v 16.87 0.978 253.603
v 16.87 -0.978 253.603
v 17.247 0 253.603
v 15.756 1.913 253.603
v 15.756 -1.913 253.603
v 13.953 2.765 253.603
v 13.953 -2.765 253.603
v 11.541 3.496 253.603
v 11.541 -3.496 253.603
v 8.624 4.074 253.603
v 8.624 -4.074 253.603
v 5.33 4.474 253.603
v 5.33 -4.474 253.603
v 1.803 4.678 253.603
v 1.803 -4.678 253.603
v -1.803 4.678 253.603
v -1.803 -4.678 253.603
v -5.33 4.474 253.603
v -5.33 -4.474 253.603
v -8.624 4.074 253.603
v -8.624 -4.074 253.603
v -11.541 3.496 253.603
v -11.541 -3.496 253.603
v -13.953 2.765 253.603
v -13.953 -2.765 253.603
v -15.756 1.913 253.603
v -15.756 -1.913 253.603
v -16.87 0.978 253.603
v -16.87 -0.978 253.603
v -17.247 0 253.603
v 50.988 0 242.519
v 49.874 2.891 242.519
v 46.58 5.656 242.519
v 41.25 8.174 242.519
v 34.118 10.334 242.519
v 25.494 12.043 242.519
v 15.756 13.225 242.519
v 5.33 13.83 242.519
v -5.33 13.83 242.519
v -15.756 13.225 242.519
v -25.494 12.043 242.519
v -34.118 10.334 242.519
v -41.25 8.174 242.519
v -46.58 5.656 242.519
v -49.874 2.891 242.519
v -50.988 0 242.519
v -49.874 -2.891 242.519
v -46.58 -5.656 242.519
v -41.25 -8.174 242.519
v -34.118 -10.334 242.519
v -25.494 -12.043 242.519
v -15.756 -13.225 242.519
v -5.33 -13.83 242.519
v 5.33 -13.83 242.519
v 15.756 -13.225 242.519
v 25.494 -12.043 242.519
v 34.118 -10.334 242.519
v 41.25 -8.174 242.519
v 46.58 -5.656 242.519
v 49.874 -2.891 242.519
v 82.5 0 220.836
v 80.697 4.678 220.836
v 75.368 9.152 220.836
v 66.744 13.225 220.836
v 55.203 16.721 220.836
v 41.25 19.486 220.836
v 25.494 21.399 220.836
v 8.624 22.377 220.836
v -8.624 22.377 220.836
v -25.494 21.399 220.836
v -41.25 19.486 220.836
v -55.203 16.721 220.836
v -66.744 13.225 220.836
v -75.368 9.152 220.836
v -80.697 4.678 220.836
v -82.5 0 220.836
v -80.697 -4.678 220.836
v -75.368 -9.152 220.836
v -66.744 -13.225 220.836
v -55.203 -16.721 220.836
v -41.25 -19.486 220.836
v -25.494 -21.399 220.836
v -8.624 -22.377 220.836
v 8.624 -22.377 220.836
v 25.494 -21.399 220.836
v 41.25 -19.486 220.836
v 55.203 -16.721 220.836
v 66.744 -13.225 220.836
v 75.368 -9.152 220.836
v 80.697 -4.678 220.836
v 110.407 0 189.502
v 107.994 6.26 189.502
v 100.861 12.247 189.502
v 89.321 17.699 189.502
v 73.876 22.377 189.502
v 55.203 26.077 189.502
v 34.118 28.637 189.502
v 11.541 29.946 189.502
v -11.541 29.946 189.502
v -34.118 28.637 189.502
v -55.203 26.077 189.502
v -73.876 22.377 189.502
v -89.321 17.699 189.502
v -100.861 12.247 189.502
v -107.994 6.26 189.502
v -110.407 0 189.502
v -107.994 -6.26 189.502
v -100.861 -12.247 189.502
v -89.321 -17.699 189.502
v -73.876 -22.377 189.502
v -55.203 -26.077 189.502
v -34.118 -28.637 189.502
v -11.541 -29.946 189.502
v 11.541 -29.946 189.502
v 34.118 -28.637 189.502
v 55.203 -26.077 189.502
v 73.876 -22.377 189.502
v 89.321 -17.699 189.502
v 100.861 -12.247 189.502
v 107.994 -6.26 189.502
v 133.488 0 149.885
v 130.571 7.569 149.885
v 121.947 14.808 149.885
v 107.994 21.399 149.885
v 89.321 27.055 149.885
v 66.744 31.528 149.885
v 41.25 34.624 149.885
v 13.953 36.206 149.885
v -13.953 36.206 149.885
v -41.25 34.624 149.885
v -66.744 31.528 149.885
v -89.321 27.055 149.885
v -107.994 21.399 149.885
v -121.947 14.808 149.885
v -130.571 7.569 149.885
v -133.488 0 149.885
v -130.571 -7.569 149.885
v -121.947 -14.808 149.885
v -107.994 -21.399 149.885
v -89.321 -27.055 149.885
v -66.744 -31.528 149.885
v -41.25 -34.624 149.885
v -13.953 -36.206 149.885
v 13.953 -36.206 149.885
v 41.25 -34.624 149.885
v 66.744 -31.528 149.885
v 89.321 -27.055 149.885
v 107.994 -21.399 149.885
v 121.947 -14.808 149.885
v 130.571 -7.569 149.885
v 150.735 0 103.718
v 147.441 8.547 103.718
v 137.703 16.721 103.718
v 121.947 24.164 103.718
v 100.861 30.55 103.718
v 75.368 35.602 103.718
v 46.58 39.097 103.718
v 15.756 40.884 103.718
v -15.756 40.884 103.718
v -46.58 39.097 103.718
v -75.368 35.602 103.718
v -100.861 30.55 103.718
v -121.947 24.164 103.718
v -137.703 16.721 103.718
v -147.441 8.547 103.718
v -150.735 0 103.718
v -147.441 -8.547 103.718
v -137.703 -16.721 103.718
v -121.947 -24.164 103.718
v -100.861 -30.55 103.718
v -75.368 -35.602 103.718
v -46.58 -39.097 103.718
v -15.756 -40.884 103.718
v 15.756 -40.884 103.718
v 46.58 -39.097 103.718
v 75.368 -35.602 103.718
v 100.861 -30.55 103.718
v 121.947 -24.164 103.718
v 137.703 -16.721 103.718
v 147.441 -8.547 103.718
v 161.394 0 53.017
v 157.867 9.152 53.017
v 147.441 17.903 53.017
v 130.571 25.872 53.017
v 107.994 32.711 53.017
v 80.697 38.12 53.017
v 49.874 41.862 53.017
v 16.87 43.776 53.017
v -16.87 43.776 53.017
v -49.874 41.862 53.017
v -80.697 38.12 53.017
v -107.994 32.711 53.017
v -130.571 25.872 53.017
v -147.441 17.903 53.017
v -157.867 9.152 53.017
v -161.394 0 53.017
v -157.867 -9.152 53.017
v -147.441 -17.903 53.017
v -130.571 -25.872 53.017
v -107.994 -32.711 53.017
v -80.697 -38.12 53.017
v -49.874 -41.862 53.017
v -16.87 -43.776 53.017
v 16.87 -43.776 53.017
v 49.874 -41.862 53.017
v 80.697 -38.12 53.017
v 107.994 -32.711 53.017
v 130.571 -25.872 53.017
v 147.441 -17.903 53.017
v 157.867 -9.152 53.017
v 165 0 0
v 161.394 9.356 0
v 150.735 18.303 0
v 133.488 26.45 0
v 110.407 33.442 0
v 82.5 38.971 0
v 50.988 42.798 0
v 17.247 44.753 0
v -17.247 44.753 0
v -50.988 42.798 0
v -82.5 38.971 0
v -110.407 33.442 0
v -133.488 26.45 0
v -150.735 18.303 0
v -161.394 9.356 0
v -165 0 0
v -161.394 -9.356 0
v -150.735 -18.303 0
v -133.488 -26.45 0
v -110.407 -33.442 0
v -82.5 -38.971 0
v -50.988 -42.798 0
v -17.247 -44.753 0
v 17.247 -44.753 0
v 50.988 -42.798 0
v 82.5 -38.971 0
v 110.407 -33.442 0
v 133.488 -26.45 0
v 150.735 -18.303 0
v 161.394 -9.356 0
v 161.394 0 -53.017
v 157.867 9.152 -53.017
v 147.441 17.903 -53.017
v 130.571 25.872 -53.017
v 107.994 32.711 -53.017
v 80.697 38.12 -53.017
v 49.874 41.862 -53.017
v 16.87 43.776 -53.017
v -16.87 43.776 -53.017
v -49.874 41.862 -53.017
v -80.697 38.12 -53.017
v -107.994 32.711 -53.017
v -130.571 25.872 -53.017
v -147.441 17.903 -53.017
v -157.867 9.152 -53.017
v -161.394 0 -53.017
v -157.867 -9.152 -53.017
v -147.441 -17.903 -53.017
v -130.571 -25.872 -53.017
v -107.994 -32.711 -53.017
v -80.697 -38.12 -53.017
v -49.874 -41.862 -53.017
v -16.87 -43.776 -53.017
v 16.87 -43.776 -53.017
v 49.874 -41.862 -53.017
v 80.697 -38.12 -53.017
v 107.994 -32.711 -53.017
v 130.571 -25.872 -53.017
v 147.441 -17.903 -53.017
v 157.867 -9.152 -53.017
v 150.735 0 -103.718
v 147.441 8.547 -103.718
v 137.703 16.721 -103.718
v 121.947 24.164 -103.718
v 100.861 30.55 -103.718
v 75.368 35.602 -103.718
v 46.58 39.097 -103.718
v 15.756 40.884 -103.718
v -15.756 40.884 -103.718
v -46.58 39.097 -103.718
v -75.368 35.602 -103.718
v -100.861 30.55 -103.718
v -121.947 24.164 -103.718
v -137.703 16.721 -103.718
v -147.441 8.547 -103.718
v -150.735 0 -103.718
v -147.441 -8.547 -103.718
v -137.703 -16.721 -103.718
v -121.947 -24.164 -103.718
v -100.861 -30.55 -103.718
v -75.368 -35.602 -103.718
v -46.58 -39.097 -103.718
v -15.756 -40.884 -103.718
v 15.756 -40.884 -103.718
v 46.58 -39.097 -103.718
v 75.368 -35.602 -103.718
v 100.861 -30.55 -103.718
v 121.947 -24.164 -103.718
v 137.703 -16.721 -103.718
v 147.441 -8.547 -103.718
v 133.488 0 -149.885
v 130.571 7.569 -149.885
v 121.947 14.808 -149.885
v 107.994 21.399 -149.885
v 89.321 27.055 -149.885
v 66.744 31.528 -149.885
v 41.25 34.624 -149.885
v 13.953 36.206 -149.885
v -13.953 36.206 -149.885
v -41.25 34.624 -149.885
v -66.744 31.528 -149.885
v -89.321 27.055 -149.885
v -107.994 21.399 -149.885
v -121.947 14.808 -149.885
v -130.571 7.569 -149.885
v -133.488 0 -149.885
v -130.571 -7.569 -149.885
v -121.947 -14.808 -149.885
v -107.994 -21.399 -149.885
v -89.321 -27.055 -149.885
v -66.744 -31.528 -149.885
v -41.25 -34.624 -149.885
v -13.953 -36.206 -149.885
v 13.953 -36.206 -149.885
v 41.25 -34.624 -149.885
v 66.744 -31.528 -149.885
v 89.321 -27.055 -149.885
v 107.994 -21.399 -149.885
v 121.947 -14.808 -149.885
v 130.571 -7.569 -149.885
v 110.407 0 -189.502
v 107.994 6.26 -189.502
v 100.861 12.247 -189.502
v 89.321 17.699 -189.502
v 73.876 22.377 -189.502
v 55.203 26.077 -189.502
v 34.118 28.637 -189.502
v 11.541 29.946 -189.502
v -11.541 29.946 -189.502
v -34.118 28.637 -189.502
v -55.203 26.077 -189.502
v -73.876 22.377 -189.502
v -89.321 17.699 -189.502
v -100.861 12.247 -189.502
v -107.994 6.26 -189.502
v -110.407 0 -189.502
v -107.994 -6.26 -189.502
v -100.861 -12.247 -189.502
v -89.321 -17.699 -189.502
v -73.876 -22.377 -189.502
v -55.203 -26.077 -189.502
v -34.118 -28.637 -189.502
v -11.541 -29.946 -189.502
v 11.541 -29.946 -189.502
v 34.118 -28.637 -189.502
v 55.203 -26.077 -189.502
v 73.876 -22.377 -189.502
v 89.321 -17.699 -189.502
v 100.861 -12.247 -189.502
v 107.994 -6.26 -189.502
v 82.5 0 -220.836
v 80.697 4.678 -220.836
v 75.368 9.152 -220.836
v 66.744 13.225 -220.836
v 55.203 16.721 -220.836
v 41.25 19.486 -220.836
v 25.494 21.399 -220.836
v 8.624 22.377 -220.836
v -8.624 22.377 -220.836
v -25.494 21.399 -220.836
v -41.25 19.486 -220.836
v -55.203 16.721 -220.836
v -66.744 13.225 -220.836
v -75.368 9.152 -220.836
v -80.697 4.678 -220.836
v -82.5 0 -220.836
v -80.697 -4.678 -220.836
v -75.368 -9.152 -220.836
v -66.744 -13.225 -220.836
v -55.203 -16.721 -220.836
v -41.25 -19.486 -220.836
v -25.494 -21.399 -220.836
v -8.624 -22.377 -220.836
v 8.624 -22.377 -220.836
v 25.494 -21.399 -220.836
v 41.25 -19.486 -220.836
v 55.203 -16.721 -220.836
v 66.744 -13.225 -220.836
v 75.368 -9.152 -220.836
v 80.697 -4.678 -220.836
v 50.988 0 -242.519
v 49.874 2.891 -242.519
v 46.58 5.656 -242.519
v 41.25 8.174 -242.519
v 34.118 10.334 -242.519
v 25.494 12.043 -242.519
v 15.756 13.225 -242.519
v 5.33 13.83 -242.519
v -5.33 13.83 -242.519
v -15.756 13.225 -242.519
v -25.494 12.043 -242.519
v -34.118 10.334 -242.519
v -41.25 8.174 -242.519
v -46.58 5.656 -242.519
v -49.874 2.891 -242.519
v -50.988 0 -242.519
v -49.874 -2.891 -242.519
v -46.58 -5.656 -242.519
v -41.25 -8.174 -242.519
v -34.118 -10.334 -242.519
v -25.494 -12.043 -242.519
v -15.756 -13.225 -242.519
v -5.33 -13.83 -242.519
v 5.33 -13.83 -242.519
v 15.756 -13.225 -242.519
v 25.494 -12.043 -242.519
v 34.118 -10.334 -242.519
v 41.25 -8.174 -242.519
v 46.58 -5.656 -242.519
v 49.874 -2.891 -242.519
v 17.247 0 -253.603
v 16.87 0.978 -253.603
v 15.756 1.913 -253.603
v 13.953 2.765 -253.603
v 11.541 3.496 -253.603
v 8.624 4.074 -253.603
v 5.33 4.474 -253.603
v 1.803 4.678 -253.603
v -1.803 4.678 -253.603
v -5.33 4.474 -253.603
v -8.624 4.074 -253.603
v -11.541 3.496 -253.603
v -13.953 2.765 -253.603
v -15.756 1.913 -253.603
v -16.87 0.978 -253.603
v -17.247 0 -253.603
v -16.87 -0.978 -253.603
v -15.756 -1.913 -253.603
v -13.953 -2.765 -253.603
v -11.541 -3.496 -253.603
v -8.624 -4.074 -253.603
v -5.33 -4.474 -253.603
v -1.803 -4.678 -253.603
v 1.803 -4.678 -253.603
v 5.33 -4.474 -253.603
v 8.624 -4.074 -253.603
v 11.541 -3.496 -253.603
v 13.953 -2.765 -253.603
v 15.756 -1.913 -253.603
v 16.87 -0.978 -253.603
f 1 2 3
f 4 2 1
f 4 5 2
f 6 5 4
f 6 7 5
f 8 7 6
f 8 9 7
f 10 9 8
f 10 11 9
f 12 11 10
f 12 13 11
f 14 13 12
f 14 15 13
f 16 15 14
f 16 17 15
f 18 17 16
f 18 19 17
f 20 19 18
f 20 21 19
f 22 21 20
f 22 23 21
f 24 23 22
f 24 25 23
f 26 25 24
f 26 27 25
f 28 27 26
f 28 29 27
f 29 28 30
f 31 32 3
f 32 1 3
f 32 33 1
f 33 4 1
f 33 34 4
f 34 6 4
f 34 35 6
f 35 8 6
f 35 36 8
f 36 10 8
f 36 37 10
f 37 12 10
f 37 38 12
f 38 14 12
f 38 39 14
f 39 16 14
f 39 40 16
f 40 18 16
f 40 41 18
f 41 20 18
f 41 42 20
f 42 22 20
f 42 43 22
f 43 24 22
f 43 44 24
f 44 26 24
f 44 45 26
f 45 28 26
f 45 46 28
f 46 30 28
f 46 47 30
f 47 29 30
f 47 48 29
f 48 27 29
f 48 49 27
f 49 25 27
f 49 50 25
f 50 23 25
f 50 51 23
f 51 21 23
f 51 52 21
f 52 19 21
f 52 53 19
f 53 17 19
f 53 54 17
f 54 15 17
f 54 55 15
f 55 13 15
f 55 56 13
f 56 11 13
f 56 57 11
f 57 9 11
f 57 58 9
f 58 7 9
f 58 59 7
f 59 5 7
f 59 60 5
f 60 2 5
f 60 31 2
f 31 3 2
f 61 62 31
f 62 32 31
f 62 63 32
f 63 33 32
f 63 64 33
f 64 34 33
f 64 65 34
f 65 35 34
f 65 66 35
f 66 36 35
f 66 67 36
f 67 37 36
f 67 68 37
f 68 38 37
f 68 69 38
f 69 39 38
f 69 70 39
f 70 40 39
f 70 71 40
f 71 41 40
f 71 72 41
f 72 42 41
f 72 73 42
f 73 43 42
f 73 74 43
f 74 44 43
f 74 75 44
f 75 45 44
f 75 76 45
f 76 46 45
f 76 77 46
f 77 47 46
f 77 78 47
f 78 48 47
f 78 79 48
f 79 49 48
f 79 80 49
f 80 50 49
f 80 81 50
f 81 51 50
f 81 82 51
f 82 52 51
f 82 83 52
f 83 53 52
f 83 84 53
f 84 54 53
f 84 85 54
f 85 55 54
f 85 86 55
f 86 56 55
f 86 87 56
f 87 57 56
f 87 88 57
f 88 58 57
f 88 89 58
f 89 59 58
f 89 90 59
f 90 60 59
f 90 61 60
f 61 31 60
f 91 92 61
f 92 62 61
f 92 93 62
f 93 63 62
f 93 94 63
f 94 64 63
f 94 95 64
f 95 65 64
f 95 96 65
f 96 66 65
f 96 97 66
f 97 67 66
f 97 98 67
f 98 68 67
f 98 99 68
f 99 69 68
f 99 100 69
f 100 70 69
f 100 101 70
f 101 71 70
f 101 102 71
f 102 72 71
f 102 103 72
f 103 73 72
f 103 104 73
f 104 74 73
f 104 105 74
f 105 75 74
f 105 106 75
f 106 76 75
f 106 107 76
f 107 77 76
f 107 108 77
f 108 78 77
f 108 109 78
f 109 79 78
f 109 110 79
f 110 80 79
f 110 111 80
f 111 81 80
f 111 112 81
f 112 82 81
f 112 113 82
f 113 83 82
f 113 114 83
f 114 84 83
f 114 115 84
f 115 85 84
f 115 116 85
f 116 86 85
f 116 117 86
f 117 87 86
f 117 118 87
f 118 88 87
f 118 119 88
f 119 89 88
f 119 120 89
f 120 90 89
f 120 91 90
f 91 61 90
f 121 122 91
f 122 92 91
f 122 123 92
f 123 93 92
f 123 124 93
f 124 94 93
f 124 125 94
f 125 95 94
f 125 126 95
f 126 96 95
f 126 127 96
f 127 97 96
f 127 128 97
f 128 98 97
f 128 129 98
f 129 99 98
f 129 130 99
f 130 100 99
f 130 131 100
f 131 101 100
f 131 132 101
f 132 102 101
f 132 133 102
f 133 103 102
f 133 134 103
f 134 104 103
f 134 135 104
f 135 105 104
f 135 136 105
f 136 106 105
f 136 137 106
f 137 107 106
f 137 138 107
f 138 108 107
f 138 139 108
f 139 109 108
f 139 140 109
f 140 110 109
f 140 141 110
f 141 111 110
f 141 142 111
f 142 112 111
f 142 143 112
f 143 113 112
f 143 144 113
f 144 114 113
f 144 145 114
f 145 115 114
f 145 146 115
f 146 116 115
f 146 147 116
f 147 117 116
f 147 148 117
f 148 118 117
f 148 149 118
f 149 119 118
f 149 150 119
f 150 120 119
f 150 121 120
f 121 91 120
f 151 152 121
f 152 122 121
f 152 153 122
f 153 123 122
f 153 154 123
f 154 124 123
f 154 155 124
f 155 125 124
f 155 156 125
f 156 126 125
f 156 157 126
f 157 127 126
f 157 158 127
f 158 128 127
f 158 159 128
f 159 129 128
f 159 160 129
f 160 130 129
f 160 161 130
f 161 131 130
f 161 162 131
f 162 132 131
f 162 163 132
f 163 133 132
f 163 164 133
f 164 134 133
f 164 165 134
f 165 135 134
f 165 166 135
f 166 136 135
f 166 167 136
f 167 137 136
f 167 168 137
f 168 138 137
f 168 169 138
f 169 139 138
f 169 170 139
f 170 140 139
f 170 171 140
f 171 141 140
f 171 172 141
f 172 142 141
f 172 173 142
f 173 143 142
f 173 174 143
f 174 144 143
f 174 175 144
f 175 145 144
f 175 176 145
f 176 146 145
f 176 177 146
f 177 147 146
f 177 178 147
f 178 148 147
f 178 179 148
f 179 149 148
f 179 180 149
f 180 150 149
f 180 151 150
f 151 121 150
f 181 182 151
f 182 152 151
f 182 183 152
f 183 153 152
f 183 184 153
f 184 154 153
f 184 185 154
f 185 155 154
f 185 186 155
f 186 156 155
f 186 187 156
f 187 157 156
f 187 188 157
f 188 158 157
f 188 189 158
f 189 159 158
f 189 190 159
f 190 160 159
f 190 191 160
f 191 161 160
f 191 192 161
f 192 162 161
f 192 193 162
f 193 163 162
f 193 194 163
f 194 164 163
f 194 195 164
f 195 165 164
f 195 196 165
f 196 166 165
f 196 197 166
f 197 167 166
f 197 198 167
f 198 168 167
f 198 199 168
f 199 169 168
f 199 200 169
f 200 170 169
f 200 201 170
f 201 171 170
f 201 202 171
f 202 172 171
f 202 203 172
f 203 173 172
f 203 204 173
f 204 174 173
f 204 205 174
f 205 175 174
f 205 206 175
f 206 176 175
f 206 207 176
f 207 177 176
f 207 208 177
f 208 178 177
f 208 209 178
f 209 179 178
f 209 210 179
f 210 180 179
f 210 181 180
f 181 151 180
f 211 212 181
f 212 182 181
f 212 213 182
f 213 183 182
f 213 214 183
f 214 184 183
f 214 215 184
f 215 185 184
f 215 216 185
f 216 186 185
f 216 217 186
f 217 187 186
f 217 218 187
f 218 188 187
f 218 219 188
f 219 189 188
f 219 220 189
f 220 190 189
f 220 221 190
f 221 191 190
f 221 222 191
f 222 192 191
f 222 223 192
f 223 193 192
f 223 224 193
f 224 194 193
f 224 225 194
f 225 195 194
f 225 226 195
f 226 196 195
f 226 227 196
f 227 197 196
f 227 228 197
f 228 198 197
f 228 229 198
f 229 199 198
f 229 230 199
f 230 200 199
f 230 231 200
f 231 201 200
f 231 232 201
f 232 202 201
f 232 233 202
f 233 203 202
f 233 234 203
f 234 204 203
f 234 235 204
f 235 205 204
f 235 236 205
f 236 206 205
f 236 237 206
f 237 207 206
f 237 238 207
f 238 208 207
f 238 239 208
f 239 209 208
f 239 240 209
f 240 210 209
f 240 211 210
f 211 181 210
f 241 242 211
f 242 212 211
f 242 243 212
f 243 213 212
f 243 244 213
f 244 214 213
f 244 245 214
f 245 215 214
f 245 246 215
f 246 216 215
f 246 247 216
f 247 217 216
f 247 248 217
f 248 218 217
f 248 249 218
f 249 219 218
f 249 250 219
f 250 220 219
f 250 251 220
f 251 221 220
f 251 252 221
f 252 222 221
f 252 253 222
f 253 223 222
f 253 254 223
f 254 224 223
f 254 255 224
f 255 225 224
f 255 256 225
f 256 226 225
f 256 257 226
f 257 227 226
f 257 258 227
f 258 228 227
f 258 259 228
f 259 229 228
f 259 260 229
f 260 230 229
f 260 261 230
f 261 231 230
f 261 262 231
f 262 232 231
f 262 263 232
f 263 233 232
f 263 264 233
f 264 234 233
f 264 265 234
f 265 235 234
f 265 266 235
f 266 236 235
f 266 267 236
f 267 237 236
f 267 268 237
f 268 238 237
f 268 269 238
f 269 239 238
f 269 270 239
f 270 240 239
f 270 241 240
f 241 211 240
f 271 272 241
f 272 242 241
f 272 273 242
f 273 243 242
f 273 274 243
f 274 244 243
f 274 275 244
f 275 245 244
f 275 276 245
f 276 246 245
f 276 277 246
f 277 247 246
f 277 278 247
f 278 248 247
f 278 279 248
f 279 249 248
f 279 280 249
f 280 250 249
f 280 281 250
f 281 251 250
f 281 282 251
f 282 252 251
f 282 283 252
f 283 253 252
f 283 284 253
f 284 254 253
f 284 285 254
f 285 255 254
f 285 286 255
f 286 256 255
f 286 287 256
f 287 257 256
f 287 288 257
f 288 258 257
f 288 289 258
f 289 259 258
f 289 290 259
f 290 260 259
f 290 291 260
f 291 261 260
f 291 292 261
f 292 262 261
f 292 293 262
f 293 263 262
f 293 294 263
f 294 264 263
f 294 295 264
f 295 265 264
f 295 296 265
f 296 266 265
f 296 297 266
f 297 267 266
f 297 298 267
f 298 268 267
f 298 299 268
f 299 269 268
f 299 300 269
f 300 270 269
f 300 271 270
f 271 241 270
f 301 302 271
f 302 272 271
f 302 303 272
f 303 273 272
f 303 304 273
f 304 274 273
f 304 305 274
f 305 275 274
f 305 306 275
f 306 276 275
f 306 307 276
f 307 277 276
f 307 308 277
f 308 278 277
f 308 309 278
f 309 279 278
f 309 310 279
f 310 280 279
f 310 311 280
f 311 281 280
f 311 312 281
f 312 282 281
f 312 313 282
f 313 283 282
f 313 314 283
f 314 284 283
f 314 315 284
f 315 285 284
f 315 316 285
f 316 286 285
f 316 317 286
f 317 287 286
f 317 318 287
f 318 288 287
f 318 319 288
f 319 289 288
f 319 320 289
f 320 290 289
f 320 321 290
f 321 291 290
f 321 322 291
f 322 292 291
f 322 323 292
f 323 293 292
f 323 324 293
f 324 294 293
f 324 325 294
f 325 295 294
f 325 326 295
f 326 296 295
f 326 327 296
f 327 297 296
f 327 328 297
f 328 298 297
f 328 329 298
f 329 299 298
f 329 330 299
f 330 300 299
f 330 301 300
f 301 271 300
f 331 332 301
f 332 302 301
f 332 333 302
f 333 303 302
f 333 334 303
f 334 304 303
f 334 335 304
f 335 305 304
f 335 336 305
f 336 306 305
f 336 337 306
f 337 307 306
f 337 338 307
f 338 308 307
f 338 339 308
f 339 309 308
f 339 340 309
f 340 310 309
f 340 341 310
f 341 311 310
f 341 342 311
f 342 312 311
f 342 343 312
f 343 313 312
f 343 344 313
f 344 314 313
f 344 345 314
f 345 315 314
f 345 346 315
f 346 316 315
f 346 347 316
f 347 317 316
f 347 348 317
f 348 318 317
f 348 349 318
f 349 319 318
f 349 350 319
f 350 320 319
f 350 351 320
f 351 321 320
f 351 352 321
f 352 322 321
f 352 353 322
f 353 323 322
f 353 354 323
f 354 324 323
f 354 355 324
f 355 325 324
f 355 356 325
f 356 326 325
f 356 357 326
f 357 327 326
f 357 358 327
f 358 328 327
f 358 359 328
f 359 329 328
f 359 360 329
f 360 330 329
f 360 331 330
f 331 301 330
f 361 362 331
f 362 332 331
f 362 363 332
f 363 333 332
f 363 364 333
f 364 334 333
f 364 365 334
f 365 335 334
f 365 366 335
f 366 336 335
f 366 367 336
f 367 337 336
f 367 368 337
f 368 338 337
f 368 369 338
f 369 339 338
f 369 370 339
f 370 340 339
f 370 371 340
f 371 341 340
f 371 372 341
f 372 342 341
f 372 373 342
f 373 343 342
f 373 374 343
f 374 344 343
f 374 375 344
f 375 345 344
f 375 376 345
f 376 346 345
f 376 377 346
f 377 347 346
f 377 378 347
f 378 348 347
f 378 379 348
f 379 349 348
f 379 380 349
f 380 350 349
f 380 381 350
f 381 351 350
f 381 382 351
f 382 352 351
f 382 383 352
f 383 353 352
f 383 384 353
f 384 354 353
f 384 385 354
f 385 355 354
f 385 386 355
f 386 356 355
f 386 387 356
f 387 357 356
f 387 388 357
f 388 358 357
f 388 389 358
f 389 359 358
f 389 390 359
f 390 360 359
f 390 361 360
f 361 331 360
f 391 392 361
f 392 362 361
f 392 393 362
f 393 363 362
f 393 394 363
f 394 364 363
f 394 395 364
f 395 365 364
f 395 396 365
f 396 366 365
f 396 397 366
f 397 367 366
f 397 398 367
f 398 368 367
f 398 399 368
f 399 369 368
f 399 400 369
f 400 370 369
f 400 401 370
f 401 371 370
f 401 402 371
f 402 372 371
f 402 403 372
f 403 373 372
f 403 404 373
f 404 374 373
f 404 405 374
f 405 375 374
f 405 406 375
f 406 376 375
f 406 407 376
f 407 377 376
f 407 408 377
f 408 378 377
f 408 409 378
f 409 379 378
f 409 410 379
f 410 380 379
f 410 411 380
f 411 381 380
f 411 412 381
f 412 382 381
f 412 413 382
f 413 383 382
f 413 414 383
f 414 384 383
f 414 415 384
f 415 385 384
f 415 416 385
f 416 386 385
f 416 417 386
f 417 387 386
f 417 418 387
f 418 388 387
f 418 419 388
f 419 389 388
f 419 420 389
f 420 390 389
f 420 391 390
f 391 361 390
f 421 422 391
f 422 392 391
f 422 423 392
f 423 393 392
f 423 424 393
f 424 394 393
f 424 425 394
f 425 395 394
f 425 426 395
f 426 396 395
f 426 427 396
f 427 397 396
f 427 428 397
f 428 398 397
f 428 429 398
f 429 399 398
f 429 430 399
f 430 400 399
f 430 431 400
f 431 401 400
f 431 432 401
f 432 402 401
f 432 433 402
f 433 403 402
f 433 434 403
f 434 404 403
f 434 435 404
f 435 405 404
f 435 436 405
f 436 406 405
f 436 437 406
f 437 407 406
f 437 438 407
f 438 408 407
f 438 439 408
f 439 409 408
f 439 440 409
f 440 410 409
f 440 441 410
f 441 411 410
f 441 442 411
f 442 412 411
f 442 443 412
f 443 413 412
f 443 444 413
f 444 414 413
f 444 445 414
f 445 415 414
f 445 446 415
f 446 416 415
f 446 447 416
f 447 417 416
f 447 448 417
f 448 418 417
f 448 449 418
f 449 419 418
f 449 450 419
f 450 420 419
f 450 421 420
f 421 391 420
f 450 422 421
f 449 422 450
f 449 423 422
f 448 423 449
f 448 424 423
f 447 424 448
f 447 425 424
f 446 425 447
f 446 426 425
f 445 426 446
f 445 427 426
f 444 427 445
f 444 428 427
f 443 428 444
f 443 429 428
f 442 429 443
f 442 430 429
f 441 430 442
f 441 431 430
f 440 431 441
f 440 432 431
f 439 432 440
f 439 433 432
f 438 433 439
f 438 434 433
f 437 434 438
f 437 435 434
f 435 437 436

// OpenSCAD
// Generated by SolidPython 1.0.1 on 2020-07-29 00:46:49


scale(v = [11, 3, 17]) {
	sphere(r = 15);
}
/***********************************************
*********      SolidPython code:      **********
************************************************
 
# import packages: SolidPython
from solid import *
from solid.utils import *
from itertools import chain, combinations, permutations


class Resize:

    def __init__(self, scad_file):
        self.scad_file = scad_file
        #self.scad_file = import_scad(scad_file)
        # cone/cylinder param:
        self.r1 = 0
        self.r2 = 0
        self.h = 0
        # rectangular prism param:
        self.w = 0
        self.l = 0
        # ellipse param:
        self.r = 0

    # import OpenScad code (file name corresponds to shape)


    # classify shape + parameters
    def assign(self, param1, param2, param3):
        if self.scad_file == 'cone.scad':
            self.r1 = param1
            self.r2 = param2
            self.h = param3
        elif self.scad_file == 'cylinder.scad':
            self.r1 = param1
            self.r2 = param2
            self.h = param3
        elif self.scad_file == 'rectangularPrism.scad':
            self.h = param1
            self.l = param2
            self.w = param3
        else:
            self.r = param1
            self.h = param2

    # resize parameters
    def iterate(self):
        x = range(3, 20, 2)
        i = 1
        if self.scad_file == 'cone.scad':
            tempList = list(permutations(x, 2))
            for temp in tempList:
                param1 = temp[0]
                param2 = temp[1]
                filepath = 'produced_scad_files/' + 'cone' + str(param1) + '_' + str(param2) + '_' + '.scad'
                scad_render_to_file(cylinder(h=param1, r1=param2, r2=0), filepath)

        elif self.scad_file == 'cylinder.scad':
            tempList = list(permutations(x, 3))
            for temp in tempList:
                param1 = temp[0]
                param2 = temp[1]
                filepath = 'produced_scad_files/' + 'cylinder' + str(param1) + '_' + str(param2) + '_' + '.scad'
                scad_render_to_file(cylinder(h=param1, r1=param2, r2=param2), filepath)

        elif self.scad_file == 'rectangularPrism.scad':
            tempList = list(permutations(x, 3))
            for temp in tempList:
                param1 = temp[0]
                param2 = temp[1]
                param3 = temp[2]
                filepath = 'produced_scad_files/' + 'rectangularPrism' + str(param1) + '_' + str(param2) + '_' + str(
                    param3) + '.scad'
                scad_render_to_file(cube(size=(param1, param2, param3)), filepath)

        elif self.scad_file == 'ellipse.scad':
            tempList = list(permutations(x, 4))
            for temp in tempList:
                param1 = temp[0]
                param2 = temp[1]
                param3 = temp[2]
                param4 = temp[3]
                filepath = 'produced_scad_files/' + 'ellipse' + str(param1) + '_' + str(param2) + '_' + str(param3) + '_' + str(param4) + '.scad'
                scad_render_to_file(scale([param1, param2, param3])(sphere(r=param4)), filepath)

    def render_to_scadfile(self):
        scad_render_to_file(scad, 'example.scad') 
 
************************************************/
